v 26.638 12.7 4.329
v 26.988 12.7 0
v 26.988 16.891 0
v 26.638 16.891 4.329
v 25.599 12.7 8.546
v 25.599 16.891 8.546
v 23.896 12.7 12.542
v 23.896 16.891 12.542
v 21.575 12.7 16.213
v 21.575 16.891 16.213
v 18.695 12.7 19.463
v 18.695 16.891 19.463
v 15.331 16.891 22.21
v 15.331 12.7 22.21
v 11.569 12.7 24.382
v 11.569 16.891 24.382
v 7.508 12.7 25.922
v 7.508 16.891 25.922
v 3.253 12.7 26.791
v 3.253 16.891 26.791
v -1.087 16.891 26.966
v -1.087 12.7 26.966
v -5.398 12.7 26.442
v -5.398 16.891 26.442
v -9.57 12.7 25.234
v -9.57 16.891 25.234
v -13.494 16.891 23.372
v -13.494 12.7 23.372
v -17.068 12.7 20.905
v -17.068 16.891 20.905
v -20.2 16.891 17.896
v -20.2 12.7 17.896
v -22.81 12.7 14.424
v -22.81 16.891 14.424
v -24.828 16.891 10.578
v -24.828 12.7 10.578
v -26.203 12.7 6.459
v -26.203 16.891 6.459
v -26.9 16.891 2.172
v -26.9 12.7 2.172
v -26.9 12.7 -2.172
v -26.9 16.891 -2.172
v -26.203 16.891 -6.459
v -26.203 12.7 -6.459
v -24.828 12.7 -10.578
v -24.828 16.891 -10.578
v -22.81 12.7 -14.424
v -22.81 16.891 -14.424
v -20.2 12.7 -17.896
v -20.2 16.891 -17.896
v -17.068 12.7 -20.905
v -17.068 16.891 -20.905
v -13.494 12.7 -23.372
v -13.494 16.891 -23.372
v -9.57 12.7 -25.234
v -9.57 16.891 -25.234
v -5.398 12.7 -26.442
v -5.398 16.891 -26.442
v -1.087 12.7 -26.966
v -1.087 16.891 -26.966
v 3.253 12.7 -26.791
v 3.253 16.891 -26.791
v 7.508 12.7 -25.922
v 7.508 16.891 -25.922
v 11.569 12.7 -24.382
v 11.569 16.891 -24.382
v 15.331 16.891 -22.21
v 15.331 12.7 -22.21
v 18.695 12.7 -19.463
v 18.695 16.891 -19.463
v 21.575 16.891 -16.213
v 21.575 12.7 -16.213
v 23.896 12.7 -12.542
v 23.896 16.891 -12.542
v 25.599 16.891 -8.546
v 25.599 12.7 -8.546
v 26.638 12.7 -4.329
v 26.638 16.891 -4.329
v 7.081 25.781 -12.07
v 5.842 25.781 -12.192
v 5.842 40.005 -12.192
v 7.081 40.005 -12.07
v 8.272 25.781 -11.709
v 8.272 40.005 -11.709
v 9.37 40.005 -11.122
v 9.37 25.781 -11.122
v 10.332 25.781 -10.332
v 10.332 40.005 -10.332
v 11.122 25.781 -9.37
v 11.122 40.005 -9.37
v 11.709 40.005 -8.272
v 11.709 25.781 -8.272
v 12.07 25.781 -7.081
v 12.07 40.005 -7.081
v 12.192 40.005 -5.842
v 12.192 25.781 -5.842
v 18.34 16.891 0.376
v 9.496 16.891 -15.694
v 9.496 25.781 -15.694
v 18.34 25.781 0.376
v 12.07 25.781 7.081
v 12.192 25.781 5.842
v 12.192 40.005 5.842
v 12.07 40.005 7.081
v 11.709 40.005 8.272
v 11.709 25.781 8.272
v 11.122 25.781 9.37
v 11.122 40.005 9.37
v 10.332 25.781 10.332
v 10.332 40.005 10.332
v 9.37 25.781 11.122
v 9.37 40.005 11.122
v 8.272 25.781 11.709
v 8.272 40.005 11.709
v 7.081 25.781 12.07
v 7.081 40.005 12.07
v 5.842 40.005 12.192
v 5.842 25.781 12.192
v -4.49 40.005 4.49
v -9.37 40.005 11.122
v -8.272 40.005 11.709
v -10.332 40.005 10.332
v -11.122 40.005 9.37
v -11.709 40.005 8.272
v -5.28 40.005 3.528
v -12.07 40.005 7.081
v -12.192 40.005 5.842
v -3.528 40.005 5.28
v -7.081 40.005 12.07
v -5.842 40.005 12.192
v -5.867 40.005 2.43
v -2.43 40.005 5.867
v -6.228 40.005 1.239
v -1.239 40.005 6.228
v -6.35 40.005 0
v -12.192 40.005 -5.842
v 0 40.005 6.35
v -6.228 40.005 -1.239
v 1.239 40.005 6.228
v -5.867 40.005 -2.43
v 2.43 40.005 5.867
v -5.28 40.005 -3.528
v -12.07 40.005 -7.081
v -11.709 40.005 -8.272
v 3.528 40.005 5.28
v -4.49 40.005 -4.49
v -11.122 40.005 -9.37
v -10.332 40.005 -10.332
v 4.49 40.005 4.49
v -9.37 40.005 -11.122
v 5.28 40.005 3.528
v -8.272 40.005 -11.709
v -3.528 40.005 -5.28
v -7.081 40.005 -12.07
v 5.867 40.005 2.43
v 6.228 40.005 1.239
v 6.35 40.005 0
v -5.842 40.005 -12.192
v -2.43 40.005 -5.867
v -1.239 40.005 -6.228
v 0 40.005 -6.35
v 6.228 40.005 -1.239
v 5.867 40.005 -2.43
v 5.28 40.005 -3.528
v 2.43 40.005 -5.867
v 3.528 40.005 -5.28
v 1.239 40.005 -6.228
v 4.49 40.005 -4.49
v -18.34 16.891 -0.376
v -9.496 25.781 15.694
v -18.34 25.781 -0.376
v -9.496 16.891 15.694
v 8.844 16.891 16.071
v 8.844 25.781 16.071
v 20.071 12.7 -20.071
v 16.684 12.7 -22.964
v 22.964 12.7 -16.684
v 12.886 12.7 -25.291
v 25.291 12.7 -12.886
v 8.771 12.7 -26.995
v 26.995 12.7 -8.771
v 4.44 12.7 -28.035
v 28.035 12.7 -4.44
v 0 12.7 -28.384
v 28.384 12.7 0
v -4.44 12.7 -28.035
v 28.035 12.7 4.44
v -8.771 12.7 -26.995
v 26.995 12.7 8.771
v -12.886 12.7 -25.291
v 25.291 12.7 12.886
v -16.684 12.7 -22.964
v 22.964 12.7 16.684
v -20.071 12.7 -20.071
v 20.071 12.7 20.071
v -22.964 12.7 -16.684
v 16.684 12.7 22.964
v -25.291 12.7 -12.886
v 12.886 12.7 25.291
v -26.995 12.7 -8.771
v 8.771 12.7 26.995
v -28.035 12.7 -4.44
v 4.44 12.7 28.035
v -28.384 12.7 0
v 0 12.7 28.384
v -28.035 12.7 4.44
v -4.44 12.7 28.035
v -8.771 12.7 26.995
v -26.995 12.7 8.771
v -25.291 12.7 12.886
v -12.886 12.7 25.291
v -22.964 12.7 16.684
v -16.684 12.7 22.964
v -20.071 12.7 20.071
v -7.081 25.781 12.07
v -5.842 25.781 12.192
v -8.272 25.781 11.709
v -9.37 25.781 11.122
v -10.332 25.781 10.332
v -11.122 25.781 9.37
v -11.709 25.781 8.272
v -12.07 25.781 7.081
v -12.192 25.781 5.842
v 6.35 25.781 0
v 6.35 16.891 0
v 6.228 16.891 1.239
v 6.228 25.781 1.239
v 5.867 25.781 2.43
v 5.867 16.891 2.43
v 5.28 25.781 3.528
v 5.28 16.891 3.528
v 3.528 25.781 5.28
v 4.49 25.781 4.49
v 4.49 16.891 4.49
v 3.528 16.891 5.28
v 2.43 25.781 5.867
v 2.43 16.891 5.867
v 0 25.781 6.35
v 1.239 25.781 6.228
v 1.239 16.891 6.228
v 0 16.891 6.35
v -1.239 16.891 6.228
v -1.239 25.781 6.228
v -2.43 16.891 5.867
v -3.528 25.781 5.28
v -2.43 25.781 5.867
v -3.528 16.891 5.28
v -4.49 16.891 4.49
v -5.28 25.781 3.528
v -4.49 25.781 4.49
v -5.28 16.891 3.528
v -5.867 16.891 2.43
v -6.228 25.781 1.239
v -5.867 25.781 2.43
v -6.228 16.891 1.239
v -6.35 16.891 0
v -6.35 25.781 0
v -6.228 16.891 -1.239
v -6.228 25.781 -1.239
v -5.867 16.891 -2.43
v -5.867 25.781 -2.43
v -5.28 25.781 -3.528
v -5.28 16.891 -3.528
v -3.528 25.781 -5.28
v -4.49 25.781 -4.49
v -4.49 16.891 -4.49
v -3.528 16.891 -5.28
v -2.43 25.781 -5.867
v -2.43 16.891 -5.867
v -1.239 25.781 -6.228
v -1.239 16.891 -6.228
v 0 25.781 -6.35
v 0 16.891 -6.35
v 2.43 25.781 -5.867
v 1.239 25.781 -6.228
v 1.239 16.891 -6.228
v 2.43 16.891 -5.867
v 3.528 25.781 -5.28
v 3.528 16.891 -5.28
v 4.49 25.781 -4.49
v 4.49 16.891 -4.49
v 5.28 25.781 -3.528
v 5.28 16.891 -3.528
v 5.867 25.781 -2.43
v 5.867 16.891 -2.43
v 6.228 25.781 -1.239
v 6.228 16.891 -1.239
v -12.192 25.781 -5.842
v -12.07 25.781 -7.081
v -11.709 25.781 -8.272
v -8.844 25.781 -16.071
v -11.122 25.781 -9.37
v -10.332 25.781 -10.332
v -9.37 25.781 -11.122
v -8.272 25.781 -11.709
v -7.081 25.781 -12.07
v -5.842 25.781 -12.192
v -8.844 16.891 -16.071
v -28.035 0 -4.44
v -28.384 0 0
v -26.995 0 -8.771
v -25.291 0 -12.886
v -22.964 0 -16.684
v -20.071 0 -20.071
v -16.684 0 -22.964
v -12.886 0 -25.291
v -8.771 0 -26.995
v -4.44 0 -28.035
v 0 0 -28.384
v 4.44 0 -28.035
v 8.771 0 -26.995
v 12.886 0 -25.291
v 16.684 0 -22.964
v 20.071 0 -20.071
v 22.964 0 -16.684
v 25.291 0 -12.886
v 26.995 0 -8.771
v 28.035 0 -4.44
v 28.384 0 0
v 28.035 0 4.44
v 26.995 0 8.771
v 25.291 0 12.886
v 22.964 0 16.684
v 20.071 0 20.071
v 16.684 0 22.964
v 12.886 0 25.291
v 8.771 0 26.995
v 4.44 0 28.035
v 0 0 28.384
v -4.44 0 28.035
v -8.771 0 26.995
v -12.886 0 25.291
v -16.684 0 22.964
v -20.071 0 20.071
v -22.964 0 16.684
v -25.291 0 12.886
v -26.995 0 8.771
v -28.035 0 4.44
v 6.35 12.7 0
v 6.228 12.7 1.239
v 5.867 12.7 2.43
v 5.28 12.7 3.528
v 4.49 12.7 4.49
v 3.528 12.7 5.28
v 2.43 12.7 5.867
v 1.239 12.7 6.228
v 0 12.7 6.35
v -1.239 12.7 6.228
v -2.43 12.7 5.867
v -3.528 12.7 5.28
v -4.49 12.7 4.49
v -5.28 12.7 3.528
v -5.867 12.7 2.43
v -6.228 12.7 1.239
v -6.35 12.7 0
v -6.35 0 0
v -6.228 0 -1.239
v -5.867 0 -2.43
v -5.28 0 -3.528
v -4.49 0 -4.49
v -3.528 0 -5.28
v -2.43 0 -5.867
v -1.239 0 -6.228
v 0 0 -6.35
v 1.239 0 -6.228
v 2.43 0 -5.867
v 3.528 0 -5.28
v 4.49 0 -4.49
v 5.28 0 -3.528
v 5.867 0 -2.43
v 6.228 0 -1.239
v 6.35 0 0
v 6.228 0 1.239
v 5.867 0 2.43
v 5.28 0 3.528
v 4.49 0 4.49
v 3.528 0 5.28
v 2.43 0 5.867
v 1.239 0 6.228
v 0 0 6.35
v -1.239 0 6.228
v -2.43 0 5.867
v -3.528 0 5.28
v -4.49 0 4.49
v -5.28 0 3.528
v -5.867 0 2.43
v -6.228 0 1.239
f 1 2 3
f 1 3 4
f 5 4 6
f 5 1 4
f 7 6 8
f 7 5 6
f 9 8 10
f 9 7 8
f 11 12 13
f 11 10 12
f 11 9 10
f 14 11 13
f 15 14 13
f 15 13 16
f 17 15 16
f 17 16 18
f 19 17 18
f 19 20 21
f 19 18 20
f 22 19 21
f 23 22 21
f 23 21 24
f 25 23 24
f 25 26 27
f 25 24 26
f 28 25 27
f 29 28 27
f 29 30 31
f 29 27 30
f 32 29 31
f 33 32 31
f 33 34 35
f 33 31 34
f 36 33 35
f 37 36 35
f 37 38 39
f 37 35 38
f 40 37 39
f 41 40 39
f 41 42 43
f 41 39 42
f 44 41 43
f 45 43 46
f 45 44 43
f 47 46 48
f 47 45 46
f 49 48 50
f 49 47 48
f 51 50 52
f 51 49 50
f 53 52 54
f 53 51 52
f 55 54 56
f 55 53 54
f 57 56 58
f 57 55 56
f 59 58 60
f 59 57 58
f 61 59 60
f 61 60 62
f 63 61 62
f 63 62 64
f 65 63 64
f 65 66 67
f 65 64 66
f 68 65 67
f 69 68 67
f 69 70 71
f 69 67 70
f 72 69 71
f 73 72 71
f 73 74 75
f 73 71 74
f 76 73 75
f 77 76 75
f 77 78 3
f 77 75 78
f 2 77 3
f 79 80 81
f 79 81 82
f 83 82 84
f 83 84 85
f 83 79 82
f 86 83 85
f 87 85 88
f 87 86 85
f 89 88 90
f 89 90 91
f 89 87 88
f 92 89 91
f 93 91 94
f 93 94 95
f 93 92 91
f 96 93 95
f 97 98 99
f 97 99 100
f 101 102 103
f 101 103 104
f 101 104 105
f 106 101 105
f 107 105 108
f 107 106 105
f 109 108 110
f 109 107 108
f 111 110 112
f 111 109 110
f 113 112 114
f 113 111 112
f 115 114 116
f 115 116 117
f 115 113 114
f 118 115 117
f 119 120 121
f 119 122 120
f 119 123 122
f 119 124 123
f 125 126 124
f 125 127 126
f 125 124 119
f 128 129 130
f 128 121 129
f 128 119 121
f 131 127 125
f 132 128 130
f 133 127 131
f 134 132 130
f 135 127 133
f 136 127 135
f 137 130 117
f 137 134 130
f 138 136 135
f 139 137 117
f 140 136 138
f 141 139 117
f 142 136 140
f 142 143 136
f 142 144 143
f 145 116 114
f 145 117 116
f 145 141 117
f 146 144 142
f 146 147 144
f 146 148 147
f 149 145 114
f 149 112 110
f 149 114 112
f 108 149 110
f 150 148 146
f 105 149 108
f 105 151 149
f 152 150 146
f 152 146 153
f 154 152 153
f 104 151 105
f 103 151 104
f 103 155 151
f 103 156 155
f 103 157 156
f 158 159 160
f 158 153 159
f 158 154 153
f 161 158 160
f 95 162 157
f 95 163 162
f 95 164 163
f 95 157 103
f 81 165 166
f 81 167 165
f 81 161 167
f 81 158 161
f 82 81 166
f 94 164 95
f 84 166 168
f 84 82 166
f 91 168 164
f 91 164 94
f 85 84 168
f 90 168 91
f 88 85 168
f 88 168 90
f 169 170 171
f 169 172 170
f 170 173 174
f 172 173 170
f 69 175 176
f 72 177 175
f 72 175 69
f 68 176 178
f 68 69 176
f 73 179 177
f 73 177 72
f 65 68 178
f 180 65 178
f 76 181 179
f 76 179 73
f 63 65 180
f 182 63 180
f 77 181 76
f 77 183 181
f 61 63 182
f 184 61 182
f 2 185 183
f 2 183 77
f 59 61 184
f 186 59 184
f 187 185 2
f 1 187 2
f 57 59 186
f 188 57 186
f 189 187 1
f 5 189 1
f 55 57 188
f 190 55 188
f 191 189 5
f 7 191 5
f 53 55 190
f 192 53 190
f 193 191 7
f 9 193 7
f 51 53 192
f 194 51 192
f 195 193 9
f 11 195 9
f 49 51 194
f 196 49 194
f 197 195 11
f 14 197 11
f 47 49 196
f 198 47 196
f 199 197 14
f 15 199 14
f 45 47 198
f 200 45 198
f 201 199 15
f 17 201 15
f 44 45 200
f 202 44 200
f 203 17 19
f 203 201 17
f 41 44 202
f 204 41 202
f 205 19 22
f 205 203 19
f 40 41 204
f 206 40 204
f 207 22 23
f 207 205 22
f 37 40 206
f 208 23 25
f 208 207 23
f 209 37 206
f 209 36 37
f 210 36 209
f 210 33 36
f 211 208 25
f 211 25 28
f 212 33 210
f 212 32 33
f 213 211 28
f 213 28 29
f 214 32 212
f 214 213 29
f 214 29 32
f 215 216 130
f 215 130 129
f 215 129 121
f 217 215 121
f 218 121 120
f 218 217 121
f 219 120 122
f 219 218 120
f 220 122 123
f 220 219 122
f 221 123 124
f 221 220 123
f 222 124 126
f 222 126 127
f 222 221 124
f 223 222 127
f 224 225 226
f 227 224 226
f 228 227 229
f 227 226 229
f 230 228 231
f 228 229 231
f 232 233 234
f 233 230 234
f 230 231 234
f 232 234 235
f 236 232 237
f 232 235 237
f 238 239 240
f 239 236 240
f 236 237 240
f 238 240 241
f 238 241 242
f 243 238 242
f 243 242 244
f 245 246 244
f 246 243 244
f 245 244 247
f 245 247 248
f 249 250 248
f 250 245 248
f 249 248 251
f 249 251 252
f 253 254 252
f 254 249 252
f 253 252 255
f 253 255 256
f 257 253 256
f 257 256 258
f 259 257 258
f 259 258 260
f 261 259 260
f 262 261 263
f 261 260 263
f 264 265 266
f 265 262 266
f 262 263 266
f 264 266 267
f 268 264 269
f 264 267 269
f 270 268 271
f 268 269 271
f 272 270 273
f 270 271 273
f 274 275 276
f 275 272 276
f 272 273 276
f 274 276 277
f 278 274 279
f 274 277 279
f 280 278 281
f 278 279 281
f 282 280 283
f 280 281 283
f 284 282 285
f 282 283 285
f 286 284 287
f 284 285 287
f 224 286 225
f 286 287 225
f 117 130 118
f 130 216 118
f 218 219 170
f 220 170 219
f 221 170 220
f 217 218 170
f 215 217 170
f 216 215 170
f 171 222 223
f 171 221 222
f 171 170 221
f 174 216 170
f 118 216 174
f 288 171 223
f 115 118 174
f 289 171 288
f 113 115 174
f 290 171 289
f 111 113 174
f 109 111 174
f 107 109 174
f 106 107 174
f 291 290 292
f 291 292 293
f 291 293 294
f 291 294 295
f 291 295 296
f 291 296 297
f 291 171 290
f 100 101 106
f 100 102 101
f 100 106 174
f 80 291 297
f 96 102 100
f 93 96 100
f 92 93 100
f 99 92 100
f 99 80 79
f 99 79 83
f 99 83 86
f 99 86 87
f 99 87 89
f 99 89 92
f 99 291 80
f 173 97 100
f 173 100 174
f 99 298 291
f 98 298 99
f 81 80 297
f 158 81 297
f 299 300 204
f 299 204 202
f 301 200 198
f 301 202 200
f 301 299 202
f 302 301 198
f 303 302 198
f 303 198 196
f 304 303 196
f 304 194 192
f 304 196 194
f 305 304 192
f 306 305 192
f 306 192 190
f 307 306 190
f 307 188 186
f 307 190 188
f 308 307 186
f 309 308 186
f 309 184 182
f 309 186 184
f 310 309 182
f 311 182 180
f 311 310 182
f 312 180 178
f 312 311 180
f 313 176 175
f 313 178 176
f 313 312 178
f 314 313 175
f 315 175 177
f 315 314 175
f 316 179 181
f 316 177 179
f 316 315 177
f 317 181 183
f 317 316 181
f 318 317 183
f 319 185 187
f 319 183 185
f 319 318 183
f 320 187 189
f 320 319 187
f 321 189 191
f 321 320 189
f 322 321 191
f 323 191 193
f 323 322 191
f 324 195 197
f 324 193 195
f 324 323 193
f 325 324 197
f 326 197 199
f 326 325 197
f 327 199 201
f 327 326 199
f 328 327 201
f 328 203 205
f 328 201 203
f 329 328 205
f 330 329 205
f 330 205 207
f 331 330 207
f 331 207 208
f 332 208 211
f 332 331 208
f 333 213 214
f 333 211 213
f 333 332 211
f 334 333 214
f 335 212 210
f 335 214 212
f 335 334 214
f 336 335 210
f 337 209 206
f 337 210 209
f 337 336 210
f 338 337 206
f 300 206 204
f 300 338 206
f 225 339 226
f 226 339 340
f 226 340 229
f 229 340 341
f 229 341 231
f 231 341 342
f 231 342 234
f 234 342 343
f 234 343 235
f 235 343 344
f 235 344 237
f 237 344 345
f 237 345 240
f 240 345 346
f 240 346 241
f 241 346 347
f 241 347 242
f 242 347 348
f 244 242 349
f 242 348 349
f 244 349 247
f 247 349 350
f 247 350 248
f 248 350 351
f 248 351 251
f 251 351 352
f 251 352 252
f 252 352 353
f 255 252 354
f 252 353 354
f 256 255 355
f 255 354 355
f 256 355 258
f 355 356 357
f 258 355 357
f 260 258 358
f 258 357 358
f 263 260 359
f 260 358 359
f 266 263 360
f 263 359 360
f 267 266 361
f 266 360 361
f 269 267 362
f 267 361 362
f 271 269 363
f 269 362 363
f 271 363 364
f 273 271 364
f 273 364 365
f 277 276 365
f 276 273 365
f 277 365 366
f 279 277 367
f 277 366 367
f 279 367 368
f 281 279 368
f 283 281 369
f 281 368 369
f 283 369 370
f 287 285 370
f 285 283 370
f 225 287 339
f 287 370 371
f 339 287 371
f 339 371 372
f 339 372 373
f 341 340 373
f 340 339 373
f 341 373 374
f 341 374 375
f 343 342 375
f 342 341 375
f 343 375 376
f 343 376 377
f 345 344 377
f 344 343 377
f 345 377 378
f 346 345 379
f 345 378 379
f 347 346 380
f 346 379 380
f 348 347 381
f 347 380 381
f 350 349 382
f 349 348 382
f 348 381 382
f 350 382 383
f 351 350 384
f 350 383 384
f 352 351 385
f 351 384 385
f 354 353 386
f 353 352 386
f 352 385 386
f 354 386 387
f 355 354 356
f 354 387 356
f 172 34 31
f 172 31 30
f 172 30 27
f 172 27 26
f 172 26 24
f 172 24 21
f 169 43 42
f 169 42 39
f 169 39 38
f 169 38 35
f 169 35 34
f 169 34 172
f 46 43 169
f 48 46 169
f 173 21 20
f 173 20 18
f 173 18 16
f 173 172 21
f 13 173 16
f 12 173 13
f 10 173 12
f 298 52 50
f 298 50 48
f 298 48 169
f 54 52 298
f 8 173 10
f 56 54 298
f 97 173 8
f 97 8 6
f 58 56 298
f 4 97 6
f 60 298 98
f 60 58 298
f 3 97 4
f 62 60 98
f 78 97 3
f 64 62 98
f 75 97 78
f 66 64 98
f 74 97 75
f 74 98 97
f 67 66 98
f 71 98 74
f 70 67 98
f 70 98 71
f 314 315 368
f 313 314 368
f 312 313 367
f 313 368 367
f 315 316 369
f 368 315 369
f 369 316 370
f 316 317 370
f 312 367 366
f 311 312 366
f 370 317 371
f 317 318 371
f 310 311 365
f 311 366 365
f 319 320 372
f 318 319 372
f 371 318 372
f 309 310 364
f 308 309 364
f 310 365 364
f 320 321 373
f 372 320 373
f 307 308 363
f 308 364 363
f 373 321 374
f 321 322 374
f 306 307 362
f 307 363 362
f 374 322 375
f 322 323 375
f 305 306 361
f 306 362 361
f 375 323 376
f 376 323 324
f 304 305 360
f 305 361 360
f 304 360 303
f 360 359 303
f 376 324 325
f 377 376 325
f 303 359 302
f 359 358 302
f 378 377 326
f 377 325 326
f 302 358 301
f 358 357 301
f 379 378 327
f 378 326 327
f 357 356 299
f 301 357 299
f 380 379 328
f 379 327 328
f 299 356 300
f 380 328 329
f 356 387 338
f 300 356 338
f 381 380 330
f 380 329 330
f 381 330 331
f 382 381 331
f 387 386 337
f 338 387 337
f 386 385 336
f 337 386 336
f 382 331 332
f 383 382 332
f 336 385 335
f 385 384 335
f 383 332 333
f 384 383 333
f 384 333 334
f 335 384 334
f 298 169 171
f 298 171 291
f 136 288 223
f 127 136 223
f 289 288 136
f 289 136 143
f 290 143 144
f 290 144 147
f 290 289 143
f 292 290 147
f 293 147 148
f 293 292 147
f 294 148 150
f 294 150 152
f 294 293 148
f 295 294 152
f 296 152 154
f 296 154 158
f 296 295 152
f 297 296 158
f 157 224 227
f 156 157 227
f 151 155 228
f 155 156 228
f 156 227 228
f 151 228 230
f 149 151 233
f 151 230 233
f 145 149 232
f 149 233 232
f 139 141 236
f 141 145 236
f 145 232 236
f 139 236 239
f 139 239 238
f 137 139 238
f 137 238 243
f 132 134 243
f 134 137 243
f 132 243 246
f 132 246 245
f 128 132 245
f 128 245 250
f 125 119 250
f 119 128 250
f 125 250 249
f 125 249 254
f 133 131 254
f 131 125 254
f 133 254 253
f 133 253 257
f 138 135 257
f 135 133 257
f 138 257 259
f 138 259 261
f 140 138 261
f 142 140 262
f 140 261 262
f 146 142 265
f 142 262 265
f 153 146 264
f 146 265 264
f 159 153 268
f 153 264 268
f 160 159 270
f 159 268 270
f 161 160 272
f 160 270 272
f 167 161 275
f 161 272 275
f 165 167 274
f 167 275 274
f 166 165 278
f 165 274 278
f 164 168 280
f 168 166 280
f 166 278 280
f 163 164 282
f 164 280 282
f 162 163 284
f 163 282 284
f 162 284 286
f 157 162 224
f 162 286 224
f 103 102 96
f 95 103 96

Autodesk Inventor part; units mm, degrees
ref_plane "YZ Plane" through (0, 0, 0) normal (1, 0, 0) x (0, 1, 0)
ref_plane "XZ Plane" through (0, 0, 0) normal (0, 1, 0) x (-1, 0, 0)
ref_plane "XY Plane" through (0, 0, 0) normal (0, 0, 1) x (1, 0, 0)
sketch "Sketch1" plane through (0, 0, 0) normal (0, 1, 0) x (-1, 0, 0)
  circle A0 centre (0, 0) radius 28.3845
  circle A1 centre (0, 0) radius 6.35
  dimension "d0" = 56.769
  dimension "d1" = 12.7
extrude "Extrusion1" add sketch "Sketch1" along normal blind 12.7
sketch "Sketch2" plane through (0, 12.7, 0) normal (0, 1, 0) x (1, 0, 0)
  circle A0 centre (0, 0) radius 26.9875
  circle A1 centre (0, 0) radius 6.35
  dimension "d4" = 53.975
extrude "Extrusion2" add sketch "Sketch2" along normal blind 4.191
sketch "Sketch3" plane through (0, 16.891, 0) normal (0, 1, 0) x (1, 0, 0)
  line L0 (9.4957, 15.6943) -> (18.3395, -0.3764)
  line L1 (18.3395, -0.3764) -> (8.8438, -16.0707)
  line L2 (8.8438, -16.0707) -> (-9.4957, -15.6943)
  line L3 (-9.4957, -15.6943) -> (-18.3395, 0.3764)
  line L4 (-18.3395, 0.3764) -> (-8.8438, 16.0707)
  line L5 (-8.8438, 16.0707) -> (9.4957, 15.6943)
  circle A0 centre (0, 0) radius 6.35
extrude "Extrusion3" add sketch "Sketch3" along normal blind 8.89
sketch "Sketch4" plane through (0, 25.781, 0) normal (0, 1, 0) x (1, 0, 0)
  line L0 (-12.192, -12.192) -> (12.192, -12.192)
  line L1 (12.192, -12.192) -> (12.192, 12.192)
  line L2 (12.192, 12.192) -> (-12.192, 12.192)
  line L3 (-12.192, 12.192) -> (-12.192, -12.192)
  circle A0 centre (0, 0) radius 6.35
  dimension "d9" = 24.384
  dimension "d10" = 24.384
extrude "Extrusion4" add sketch "Sketch4" along normal blind 14.224
fillet "Fillet1" radius 6.35 4 edges at (12.192, 32.893, 12.192) (12.192, 32.893, -12.192) (-12.192, 32.893, -12.192) (-12.192, 32.893, 12.192)
properties part number "Top"
